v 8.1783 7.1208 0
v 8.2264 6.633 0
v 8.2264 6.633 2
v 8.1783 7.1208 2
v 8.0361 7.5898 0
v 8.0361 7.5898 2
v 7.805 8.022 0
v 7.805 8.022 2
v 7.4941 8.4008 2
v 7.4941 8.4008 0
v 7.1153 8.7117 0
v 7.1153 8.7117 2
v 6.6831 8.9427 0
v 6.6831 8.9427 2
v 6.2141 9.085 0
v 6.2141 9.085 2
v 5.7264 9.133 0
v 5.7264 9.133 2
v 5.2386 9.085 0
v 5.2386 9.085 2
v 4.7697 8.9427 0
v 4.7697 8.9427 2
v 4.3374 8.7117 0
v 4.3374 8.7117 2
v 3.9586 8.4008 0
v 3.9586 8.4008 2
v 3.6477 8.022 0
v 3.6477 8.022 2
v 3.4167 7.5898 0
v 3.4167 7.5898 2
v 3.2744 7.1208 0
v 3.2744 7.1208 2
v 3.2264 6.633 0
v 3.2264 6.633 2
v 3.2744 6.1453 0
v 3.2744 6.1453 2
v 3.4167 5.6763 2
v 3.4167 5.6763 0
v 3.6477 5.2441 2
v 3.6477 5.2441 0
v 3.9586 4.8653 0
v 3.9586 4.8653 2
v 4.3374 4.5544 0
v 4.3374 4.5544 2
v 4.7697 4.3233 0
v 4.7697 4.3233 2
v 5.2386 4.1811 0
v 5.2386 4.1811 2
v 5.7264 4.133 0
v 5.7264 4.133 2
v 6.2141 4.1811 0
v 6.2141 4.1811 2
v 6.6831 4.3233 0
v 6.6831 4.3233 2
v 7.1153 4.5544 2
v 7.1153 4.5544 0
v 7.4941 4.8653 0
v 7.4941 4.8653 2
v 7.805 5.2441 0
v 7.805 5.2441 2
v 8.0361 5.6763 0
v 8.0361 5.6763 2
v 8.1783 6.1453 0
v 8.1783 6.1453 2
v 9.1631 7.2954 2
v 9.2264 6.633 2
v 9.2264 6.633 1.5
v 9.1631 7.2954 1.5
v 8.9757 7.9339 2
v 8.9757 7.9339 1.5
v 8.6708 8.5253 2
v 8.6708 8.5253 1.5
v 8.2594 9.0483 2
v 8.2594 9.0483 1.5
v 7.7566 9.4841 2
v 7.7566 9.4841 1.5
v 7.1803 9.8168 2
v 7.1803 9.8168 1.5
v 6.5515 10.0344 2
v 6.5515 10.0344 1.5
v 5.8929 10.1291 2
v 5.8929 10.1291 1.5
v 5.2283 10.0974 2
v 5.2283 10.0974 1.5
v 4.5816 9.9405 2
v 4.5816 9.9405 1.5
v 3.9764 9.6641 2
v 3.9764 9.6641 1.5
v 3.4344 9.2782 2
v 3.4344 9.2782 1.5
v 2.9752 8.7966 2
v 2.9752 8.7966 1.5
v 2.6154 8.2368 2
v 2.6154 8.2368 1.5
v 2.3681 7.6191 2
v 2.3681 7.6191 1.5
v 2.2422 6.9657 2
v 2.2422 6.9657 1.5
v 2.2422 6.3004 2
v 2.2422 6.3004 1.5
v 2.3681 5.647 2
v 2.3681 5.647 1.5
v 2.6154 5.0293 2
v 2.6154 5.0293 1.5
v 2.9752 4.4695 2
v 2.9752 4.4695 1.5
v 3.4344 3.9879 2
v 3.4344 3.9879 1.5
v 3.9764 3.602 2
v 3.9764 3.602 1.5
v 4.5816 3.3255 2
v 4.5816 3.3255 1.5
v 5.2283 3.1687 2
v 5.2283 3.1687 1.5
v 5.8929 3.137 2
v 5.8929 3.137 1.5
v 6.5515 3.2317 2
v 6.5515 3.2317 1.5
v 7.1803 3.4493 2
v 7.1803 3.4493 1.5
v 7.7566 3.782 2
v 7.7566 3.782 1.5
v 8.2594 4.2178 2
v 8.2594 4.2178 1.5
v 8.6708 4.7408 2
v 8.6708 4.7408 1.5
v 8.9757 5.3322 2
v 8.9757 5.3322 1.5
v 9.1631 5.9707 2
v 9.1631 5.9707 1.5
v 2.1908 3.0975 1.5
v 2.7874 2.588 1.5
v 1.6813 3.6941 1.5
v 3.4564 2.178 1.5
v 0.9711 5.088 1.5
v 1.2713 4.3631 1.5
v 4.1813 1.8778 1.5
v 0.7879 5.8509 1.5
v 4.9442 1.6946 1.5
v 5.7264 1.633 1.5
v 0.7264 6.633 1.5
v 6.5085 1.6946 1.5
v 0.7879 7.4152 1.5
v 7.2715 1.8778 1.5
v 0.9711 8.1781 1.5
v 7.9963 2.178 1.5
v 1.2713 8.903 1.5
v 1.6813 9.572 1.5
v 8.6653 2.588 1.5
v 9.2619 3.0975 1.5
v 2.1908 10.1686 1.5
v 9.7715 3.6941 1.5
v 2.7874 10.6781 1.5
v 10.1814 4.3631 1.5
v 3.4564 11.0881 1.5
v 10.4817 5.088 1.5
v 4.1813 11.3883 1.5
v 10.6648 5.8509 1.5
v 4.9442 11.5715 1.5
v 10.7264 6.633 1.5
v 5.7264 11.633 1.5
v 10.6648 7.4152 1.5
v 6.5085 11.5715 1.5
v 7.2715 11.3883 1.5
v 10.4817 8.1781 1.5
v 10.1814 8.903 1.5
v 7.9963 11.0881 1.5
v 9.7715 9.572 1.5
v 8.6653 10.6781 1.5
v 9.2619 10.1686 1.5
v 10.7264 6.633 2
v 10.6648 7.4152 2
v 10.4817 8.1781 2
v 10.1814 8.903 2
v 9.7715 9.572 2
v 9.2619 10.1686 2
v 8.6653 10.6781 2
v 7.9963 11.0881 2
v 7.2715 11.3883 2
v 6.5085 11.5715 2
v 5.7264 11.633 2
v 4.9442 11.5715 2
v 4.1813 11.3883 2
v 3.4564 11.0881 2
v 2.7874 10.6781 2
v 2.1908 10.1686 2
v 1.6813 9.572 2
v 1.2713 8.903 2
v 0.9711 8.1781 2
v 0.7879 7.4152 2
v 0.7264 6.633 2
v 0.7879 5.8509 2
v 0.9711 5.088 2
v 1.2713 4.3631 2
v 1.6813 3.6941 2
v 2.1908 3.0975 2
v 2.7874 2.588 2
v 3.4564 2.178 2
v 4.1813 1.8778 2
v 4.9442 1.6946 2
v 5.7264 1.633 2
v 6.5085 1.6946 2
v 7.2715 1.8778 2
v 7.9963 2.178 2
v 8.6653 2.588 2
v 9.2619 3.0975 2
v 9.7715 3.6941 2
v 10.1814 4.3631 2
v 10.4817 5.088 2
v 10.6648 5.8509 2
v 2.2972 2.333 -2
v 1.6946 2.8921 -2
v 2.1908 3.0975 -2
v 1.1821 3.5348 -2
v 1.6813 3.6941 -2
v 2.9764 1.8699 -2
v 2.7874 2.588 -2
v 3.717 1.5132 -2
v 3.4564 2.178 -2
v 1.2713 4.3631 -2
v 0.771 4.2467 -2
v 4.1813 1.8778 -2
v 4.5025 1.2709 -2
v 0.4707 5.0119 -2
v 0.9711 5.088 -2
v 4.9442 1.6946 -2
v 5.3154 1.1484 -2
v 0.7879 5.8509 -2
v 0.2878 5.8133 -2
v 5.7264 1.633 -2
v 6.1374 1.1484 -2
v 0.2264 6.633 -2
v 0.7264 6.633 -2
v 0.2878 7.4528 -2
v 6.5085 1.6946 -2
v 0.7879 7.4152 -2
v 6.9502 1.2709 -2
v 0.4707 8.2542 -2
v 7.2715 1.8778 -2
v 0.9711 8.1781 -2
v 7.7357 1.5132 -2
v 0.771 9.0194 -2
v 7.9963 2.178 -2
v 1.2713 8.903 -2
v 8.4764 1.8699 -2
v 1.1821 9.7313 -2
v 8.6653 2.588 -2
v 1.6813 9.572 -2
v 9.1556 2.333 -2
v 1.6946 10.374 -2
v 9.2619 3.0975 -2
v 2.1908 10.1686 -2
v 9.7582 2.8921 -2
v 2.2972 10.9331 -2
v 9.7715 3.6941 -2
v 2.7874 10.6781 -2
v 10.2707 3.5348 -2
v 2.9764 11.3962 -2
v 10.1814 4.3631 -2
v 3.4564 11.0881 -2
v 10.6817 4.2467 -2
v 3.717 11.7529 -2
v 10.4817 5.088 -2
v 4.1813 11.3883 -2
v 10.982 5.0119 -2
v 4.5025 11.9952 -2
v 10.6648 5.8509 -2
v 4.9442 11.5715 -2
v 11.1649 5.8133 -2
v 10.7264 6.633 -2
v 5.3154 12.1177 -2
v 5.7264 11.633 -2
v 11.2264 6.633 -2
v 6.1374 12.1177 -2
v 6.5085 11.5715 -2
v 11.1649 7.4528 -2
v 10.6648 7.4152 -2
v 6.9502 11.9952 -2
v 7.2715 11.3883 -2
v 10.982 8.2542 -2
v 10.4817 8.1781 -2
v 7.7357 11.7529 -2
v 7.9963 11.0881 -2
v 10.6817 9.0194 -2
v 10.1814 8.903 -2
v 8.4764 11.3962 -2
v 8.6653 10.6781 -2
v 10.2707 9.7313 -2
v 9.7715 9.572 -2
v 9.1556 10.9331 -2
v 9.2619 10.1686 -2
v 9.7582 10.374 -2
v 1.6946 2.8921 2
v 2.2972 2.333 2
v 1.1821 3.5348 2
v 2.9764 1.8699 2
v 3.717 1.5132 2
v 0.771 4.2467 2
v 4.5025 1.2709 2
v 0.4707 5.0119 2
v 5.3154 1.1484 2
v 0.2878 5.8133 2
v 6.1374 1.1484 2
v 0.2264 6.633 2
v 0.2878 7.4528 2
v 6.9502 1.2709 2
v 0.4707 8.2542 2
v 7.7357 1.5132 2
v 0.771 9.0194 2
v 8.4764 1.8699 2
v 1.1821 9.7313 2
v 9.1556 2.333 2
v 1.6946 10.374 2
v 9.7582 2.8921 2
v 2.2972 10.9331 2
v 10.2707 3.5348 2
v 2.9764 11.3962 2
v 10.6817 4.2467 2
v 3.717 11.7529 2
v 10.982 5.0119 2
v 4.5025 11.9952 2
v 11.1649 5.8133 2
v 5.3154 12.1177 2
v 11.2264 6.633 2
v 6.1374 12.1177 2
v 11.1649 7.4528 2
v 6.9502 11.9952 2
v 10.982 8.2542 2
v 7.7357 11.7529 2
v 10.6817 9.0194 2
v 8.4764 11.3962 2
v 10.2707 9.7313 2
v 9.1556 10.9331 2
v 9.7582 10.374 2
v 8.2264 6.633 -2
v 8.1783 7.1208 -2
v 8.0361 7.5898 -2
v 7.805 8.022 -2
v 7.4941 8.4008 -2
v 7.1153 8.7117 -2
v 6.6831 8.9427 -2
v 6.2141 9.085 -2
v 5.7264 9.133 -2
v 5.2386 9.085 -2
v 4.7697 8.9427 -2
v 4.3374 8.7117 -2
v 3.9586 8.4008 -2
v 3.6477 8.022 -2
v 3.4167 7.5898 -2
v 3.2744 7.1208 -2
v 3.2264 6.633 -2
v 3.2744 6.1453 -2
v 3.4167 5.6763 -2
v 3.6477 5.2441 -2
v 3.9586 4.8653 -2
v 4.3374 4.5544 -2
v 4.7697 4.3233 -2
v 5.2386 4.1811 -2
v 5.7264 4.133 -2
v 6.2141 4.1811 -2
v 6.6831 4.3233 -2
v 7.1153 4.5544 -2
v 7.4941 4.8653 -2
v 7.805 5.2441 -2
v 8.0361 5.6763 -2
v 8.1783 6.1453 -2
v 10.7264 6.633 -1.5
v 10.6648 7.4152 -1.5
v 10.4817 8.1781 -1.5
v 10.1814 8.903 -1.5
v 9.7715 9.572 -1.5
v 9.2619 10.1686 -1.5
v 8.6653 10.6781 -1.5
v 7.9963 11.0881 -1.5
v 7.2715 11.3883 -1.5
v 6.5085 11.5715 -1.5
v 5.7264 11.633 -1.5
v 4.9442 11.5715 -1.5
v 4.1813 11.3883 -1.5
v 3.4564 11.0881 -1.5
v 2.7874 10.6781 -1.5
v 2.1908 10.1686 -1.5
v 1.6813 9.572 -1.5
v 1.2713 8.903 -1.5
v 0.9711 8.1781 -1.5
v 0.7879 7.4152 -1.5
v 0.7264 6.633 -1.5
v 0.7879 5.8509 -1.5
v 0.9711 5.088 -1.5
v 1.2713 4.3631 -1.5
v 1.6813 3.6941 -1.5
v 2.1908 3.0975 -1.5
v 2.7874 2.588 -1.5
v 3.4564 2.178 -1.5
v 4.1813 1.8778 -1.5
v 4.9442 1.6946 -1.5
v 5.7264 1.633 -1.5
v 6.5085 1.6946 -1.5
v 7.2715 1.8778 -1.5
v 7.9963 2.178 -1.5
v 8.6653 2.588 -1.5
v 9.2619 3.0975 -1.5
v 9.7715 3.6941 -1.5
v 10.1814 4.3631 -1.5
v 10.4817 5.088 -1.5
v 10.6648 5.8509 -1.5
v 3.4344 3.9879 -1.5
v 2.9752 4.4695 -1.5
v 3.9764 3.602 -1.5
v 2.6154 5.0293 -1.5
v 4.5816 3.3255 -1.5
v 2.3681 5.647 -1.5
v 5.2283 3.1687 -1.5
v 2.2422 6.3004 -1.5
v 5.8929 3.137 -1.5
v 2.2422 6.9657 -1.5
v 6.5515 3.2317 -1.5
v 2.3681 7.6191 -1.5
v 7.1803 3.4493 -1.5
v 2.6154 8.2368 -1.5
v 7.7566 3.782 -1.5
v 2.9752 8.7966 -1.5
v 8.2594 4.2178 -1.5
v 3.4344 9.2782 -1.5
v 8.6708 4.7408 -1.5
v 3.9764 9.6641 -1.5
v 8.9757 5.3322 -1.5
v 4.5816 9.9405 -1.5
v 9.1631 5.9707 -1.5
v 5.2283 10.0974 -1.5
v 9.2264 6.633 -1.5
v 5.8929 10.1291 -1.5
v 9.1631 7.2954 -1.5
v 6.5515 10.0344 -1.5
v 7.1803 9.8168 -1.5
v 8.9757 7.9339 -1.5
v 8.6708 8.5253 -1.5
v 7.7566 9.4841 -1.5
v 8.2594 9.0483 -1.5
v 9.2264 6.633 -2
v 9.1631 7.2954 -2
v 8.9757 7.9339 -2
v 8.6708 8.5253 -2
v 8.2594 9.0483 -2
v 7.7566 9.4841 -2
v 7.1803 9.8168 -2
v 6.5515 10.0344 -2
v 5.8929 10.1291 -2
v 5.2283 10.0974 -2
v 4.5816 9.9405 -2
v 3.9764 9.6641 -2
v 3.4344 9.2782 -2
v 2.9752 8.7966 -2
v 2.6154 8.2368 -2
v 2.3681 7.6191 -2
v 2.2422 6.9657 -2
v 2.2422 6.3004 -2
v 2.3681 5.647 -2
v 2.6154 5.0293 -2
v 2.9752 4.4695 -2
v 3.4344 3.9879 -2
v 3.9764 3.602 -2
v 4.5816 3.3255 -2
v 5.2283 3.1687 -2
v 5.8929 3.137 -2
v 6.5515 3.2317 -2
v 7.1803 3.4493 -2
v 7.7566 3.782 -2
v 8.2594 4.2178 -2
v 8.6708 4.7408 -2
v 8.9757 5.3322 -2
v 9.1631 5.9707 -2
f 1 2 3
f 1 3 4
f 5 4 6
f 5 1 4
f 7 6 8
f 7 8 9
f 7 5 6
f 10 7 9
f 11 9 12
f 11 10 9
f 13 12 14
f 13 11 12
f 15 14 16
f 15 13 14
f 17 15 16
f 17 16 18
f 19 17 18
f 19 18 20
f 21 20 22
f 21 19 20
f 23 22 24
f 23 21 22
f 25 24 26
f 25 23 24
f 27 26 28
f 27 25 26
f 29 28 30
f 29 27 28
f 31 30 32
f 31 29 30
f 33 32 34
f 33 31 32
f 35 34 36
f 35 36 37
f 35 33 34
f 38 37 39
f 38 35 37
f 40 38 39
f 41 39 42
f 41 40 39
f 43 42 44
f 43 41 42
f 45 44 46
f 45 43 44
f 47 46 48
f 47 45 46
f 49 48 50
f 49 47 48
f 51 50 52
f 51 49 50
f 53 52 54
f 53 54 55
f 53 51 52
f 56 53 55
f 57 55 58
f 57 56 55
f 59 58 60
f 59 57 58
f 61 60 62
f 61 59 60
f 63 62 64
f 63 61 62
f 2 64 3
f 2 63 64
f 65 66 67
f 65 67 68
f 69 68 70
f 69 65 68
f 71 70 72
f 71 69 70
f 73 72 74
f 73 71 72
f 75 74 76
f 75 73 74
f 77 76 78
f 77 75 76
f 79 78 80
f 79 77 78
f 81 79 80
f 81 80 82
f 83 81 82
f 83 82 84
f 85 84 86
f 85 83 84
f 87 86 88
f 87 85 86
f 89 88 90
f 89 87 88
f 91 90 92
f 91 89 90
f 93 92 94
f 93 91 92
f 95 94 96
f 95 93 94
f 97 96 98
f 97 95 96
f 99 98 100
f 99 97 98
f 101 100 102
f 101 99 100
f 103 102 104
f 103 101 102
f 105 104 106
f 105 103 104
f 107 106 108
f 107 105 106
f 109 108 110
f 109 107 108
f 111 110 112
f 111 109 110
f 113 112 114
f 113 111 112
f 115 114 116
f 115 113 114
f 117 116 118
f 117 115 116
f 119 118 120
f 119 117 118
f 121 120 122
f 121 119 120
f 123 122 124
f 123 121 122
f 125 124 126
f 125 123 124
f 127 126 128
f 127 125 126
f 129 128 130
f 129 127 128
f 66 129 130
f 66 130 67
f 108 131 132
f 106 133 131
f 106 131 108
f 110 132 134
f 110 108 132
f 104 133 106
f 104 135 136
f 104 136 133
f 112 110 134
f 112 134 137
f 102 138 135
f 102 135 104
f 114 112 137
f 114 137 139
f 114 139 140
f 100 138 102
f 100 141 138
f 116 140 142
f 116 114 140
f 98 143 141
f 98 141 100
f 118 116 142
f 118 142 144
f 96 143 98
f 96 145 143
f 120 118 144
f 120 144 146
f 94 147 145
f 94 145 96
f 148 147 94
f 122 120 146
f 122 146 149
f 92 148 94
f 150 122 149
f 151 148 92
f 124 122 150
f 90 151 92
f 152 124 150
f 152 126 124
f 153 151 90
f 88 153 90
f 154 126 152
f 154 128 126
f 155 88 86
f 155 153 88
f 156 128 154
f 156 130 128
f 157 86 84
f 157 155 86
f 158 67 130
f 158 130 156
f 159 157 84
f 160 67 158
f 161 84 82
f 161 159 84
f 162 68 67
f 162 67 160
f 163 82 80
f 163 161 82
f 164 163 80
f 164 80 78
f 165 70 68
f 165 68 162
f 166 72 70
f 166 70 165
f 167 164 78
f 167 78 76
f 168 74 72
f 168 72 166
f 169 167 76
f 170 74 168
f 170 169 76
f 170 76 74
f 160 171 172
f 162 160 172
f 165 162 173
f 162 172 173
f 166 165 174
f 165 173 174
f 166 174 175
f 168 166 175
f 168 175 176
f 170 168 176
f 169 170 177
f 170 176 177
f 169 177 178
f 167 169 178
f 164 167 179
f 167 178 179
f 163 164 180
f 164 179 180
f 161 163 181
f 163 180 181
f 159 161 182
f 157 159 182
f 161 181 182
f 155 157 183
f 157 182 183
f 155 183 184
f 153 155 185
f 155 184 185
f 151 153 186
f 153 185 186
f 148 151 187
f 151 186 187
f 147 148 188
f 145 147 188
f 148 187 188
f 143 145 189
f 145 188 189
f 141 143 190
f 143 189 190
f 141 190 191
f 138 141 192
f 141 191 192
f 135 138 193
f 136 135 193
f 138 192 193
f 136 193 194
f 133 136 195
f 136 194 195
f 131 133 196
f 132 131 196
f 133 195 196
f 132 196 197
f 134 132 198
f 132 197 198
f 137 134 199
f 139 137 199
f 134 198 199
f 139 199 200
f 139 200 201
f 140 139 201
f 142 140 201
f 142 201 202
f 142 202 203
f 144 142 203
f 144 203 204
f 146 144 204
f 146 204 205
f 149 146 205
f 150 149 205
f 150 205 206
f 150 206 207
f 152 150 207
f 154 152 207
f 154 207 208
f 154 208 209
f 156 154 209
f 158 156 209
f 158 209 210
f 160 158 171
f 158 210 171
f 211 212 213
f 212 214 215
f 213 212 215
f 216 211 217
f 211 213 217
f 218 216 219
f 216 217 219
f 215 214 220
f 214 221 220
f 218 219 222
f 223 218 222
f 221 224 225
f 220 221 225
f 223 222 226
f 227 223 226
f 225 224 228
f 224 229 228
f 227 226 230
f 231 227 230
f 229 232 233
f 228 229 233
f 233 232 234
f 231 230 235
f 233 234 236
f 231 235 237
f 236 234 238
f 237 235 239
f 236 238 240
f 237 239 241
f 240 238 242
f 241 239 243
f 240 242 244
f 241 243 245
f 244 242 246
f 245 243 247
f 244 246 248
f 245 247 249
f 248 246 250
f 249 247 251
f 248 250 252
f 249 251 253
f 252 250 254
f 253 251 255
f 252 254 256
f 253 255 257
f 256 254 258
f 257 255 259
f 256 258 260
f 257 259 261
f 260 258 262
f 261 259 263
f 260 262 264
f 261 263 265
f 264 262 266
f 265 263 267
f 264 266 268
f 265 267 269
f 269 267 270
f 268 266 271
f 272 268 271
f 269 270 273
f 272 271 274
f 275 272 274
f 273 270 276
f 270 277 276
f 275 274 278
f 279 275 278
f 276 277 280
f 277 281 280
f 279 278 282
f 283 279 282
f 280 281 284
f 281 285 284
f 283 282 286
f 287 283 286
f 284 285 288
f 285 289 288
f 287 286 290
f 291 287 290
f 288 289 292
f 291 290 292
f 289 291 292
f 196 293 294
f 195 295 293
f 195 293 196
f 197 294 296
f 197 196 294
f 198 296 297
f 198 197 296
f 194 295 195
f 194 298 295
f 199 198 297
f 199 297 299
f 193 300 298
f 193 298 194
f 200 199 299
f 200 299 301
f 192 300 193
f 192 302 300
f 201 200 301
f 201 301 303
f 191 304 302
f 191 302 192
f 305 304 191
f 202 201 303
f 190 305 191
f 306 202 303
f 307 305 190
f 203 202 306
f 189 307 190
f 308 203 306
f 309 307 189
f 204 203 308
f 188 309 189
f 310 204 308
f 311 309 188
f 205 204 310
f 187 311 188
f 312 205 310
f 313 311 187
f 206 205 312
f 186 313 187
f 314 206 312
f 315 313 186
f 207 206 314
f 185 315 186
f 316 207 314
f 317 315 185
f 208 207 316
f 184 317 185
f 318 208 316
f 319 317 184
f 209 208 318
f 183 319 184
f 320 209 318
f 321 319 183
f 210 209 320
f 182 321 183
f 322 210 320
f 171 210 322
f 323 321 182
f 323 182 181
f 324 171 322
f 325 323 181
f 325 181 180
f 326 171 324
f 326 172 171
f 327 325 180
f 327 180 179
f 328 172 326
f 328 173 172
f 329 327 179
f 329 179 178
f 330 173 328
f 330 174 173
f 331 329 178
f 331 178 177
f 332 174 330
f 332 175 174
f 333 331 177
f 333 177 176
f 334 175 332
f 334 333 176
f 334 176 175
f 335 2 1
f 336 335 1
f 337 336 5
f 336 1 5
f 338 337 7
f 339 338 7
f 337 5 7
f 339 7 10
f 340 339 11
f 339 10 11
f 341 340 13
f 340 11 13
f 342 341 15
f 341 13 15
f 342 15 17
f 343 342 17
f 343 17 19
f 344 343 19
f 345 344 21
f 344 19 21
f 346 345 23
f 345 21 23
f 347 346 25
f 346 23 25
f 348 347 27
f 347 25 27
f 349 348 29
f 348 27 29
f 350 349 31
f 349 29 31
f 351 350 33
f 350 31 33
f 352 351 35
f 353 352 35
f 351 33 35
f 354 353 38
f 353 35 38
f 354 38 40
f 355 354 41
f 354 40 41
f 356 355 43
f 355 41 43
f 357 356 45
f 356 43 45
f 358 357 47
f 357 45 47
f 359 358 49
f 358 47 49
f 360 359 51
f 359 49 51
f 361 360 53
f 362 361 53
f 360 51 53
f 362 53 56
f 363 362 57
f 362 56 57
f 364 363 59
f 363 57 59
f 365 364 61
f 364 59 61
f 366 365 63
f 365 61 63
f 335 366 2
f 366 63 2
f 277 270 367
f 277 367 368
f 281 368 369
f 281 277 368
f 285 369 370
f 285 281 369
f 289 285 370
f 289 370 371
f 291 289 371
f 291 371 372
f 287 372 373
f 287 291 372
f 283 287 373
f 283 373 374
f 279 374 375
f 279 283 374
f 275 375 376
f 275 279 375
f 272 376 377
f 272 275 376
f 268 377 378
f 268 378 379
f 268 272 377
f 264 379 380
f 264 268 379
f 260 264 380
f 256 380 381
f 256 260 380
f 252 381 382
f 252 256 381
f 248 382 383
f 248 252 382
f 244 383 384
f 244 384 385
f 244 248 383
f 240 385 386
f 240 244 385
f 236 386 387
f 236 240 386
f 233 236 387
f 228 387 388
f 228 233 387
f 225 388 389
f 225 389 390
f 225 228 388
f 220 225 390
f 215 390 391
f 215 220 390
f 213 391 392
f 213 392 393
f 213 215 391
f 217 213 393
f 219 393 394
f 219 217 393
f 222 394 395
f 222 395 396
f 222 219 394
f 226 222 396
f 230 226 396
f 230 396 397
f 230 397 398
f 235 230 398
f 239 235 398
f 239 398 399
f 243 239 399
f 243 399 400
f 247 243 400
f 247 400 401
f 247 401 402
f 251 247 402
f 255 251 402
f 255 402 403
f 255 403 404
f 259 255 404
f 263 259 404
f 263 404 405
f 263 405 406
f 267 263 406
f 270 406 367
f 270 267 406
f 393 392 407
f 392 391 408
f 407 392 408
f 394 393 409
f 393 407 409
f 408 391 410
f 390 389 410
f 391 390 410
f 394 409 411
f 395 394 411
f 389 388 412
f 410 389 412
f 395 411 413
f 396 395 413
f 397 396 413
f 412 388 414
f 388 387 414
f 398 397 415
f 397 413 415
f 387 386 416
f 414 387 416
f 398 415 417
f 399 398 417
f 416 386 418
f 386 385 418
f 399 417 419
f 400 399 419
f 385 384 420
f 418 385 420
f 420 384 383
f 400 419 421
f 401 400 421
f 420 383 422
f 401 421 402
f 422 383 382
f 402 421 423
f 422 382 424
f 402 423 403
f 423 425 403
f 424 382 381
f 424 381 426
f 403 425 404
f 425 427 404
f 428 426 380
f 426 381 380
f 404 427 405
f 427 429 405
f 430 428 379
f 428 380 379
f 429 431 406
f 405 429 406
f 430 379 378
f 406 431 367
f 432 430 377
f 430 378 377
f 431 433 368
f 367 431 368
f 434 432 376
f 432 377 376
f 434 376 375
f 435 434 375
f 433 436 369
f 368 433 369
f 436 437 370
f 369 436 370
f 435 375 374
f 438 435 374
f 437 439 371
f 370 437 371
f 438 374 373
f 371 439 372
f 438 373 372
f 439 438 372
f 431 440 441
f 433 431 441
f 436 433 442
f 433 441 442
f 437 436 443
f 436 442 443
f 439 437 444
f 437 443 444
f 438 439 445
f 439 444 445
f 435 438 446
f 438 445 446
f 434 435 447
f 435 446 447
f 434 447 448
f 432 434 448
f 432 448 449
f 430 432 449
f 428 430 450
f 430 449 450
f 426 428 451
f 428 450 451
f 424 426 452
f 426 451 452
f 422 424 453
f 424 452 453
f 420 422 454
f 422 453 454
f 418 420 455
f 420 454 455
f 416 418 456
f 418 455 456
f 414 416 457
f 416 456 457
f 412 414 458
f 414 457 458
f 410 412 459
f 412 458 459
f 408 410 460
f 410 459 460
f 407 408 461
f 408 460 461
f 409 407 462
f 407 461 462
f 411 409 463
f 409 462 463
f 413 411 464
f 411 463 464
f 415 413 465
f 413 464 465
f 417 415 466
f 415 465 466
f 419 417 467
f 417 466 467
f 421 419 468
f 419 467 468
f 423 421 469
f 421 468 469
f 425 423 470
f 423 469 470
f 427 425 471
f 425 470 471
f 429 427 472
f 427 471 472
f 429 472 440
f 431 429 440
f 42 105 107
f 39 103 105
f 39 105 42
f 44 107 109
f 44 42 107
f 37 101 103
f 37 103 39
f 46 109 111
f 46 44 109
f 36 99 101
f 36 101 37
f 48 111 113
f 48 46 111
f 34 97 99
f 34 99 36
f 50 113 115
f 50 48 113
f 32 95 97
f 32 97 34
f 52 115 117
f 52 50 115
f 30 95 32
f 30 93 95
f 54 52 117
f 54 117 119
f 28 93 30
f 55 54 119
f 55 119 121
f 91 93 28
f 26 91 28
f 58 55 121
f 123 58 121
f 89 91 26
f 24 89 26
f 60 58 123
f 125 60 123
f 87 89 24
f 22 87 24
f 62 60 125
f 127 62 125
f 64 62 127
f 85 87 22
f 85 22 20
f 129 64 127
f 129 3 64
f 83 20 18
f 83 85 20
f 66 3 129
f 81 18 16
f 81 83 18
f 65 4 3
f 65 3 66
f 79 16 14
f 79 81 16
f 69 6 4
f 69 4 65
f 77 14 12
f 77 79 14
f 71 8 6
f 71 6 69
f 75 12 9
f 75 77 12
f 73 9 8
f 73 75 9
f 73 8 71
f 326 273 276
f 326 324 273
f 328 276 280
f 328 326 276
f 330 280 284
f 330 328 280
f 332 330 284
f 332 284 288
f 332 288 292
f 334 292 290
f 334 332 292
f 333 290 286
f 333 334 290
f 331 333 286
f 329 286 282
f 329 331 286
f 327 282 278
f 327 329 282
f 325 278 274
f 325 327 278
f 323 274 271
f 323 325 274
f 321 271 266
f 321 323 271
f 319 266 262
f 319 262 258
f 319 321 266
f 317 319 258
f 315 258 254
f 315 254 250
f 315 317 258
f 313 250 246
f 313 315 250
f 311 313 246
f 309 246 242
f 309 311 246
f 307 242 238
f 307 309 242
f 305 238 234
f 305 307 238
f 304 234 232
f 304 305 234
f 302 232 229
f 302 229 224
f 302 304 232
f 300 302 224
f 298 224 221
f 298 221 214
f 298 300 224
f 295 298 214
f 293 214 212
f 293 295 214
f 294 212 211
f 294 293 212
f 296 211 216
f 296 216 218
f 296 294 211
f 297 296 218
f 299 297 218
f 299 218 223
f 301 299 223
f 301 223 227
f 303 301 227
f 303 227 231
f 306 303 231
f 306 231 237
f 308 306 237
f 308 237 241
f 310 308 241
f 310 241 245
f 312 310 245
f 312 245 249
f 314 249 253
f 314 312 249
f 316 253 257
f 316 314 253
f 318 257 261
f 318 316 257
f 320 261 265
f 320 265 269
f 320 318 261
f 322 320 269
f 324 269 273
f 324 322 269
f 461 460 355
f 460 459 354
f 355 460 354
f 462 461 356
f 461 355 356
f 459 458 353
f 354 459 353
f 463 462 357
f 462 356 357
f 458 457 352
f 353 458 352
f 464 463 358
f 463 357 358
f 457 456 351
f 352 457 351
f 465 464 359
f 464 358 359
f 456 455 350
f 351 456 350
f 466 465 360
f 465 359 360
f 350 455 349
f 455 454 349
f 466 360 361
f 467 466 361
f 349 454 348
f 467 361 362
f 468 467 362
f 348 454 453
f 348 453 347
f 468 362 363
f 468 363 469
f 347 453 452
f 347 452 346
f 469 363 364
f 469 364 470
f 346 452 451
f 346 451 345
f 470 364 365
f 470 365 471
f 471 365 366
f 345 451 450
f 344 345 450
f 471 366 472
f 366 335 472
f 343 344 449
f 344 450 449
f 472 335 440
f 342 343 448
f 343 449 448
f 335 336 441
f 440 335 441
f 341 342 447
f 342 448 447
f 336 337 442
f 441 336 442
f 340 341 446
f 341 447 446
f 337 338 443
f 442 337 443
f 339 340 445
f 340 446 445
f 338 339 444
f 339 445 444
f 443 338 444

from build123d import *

# Parameters (mm, degrees)
SKETCH2_R           = 5.5
SKETCH2_R_2         = 2.5
BOSS_EXTRUDE1_DEPTH = 2
SKETCH4_R           = 5
SKETCH4_R_2         = 3.5
CUT_EXTRUDE1_DEPTH  = 0.5


with BuildPart() as part:
    # Sketch2 → Boss-Extrude1 (new body)
    with BuildSketch(Plane.XY):
        with Locations((5.726371269, 6.63304672)):
            Circle(SKETCH2_R)
        with Locations((5.726371269, 6.63304672)):
            Circle(SKETCH2_R_2, mode=Mode.SUBTRACT)
    boss_extrude1 = extrude(amount=BOSS_EXTRUDE1_DEPTH)

    # Sketch4 → Cut-Extrude1 (cut)
    with BuildSketch(Plane.XY.offset(2)):
        with Locations((5.726371269, 6.63304672)):
            Circle(SKETCH4_R)
        with Locations((5.726371269, 6.63304672)):
            Circle(SKETCH4_R_2, mode=Mode.SUBTRACT)
    cut_extrude1 = extrude(amount=-CUT_EXTRUDE1_DEPTH, mode=Mode.SUBTRACT)

    # Mirror2: Boss-Extrude1, Cut-Extrude1 across plane
    add(boss_extrude1.mirror(Plane(origin=(5.726371269, 6.63304672, 0), x_dir=(1, 0, 0), z_dir=(0, 0, 1))))
    add(cut_extrude1.mirror(Plane(origin=(5.726371269, 6.63304672, 0), x_dir=(1, 0, 0), z_dir=(0, 0, 1))), mode=Mode.SUBTRACT)


solid = part.part
